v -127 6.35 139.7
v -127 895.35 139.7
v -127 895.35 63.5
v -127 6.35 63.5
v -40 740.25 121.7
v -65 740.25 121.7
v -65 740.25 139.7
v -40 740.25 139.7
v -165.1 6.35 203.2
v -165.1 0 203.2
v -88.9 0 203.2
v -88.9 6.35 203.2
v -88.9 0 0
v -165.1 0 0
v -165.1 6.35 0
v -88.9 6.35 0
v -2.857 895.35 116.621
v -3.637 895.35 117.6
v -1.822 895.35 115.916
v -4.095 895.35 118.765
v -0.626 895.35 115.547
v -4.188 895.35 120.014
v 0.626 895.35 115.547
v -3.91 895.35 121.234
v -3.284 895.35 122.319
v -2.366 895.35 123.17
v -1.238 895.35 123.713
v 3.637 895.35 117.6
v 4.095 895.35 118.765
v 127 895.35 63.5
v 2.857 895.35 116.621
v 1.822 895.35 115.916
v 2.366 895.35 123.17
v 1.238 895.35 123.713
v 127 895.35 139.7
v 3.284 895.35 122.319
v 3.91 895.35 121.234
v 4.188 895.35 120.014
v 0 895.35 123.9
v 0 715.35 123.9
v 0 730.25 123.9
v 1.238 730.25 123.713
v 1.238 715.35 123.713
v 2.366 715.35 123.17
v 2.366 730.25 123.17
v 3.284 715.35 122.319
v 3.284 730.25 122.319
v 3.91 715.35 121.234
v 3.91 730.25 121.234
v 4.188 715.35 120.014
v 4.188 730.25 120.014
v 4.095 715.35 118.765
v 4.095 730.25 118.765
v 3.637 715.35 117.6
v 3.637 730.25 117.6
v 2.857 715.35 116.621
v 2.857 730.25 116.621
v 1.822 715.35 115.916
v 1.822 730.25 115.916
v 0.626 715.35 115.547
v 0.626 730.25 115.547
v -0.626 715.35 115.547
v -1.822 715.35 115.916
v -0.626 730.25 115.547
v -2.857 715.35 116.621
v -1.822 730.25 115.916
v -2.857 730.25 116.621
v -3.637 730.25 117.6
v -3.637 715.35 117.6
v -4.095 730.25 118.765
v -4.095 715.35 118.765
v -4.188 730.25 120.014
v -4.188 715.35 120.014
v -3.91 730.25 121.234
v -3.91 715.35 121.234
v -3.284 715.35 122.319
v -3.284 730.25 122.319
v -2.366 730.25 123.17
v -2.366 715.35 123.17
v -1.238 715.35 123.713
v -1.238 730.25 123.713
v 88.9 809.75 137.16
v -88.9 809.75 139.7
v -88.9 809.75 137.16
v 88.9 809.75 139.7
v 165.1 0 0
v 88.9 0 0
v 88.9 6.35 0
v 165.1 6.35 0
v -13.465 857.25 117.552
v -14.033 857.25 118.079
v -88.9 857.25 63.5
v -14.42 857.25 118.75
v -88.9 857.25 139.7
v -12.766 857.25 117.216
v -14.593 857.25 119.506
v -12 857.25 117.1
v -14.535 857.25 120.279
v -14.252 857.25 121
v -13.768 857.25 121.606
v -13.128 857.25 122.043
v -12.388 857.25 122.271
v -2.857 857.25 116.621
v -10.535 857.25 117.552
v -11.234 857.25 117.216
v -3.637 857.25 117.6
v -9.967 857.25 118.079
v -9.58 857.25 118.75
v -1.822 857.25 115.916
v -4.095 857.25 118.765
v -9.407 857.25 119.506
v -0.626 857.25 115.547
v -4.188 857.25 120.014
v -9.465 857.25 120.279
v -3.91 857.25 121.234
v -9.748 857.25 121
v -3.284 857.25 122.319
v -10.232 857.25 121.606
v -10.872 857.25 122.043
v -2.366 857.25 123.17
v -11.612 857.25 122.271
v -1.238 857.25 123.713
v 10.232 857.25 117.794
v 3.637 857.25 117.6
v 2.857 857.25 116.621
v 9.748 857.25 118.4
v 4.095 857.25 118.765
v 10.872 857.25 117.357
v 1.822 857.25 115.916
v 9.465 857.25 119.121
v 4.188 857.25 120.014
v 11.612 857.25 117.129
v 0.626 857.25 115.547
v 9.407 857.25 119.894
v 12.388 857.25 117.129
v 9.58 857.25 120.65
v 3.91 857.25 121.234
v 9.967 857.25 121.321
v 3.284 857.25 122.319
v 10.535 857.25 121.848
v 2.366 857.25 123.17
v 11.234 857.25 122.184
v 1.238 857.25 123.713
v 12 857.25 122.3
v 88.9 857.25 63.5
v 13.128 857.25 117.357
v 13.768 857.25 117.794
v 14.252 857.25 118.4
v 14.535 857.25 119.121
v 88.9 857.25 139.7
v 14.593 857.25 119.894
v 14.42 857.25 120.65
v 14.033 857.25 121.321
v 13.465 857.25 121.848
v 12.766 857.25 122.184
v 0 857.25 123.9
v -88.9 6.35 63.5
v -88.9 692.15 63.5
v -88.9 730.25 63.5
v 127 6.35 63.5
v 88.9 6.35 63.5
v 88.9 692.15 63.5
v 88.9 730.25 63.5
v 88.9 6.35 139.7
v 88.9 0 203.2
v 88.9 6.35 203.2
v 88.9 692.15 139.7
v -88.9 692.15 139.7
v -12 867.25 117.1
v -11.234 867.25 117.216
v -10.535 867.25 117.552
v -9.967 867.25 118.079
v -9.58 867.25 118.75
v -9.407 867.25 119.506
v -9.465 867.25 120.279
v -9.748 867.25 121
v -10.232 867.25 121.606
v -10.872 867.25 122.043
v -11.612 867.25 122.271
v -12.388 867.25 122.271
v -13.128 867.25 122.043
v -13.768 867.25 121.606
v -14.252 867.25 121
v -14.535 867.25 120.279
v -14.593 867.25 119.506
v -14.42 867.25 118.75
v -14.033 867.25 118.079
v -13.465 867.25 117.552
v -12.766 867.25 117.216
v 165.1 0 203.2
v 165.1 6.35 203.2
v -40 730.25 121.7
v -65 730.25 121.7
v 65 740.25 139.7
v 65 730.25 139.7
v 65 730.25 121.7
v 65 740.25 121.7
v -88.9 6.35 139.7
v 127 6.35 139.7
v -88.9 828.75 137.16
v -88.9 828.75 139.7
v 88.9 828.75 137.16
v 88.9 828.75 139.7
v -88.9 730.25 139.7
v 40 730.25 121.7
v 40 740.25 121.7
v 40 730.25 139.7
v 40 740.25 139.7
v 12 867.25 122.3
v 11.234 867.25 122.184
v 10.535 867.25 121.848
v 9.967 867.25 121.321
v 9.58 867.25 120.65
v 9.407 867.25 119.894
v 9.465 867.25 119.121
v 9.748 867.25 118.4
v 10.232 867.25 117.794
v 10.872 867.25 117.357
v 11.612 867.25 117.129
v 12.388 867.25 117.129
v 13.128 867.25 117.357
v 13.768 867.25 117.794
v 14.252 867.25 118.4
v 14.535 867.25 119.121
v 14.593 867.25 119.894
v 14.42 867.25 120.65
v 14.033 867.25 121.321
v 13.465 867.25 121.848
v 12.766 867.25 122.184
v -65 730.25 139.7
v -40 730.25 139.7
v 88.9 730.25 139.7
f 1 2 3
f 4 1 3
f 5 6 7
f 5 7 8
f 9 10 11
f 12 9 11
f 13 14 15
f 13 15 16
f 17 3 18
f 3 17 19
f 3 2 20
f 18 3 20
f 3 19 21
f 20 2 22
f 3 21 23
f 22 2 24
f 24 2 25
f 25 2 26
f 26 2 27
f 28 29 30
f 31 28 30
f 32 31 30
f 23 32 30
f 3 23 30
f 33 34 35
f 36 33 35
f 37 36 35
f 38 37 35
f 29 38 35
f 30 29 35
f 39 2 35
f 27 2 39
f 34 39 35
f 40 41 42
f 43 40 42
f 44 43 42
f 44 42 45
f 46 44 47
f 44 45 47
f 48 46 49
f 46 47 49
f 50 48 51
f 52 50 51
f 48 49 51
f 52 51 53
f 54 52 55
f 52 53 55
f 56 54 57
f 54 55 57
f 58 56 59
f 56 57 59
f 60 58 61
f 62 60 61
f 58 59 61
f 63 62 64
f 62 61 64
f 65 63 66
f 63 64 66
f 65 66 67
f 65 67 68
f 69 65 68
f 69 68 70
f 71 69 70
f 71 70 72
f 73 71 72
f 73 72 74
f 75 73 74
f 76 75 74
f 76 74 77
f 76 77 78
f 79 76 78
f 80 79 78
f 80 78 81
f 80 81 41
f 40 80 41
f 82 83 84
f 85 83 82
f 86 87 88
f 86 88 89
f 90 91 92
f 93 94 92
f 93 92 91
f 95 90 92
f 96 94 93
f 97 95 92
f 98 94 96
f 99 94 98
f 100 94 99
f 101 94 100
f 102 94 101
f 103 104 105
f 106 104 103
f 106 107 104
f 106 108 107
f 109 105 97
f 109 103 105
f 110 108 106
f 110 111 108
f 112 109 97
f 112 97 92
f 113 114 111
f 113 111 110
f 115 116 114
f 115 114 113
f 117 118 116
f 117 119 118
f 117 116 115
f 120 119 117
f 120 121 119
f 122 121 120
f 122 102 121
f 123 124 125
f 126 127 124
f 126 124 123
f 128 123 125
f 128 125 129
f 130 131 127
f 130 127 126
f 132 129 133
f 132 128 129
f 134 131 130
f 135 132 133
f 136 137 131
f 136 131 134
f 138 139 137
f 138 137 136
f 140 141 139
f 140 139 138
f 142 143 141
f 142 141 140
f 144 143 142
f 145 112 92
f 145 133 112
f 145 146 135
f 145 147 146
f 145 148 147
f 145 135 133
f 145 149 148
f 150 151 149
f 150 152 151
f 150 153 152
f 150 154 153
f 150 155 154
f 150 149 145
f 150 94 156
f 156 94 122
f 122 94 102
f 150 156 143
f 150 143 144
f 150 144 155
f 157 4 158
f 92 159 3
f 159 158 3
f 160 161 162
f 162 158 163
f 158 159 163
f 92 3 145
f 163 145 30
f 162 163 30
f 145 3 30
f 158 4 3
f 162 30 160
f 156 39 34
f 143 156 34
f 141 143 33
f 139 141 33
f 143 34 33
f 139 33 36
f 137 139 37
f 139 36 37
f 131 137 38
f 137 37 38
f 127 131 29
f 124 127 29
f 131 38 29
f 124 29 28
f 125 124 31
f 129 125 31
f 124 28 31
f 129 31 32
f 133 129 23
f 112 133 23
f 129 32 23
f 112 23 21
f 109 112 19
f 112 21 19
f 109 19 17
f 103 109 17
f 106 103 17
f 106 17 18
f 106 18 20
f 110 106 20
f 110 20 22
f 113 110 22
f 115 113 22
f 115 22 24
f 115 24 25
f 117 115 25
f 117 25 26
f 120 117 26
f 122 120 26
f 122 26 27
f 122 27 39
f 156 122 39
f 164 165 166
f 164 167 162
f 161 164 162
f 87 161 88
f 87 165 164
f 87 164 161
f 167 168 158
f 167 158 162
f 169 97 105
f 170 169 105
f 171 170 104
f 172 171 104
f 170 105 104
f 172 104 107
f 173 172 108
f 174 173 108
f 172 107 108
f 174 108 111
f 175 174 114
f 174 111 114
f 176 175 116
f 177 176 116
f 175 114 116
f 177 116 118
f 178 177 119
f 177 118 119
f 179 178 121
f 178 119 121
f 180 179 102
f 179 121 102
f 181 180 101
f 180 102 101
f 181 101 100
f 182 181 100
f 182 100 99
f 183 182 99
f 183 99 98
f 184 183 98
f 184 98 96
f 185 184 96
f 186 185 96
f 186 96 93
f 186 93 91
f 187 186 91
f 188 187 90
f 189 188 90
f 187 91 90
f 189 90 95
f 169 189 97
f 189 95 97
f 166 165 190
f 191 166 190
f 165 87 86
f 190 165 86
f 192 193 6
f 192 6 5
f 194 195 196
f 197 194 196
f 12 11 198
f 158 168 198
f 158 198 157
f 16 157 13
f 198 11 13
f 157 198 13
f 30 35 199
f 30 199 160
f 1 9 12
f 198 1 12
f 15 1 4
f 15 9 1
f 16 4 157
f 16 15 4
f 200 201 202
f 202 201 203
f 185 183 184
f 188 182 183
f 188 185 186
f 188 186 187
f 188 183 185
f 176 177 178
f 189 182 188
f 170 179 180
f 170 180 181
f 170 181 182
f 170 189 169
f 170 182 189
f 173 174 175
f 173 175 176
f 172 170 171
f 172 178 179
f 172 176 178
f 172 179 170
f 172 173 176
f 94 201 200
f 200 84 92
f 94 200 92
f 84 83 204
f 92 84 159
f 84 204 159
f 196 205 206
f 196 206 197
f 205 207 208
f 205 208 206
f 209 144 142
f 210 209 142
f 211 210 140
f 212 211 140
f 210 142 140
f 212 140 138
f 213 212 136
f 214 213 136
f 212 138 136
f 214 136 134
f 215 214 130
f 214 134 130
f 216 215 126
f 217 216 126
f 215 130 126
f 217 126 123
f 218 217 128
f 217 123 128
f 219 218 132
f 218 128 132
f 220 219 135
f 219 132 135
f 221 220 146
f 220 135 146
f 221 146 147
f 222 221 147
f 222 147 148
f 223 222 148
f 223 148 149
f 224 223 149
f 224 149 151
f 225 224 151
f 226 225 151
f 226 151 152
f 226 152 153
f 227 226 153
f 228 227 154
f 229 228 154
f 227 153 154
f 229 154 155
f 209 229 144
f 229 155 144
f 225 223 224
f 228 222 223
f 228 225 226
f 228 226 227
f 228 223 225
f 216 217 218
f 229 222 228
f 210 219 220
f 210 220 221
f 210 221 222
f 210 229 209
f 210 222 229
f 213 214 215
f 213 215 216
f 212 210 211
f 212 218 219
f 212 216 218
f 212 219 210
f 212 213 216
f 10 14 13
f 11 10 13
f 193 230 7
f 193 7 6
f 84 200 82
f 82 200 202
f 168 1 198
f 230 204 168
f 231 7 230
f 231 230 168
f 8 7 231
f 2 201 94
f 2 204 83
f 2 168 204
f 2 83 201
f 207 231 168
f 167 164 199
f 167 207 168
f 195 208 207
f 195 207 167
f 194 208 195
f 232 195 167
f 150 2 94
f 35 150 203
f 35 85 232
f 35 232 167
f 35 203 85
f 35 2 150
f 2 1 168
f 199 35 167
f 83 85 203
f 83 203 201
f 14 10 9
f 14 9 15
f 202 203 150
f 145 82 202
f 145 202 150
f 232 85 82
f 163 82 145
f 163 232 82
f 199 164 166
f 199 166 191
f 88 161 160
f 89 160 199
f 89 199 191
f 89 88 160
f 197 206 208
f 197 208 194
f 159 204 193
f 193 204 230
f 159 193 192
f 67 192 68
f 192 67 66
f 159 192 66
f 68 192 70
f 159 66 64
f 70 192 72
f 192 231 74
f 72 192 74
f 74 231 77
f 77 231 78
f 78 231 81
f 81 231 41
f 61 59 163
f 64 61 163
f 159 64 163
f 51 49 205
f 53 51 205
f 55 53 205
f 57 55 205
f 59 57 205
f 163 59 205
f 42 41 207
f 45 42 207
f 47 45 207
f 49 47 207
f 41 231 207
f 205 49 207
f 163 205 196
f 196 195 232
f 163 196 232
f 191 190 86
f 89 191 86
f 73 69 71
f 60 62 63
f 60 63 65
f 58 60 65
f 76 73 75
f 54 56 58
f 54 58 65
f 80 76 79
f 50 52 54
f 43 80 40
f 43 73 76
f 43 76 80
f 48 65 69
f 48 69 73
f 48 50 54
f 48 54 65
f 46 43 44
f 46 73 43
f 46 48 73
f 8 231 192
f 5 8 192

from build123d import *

# Parameters (mm, degrees)
SKETCH1_W             = 76.2
SKETCH1_H             = 203.2
BOSS_EXTRUDE1_DEPTH   = 6.35
BOSS_EXTRUDE1_2_DEPTH = 6.35
SKETCH2_W             = 38.1
SKETCH2_H             = 76.2
BOSS_EXTRUDE2_DEPTH   = 889
SKETCH3_W             = 177.8
SKETCH3_H             = 38.1
BOSS_EXTRUDE3_DEPTH   = 76.2
SKETCH4_R             = 4.2
CUT_EXTRUDE1_DEPTH    = 180
SKETCH5_R             = 2.6
CUT_EXTRUDE2_DEPTH    = 10
SKETCH6_W             = 25
SKETCH6_H             = 18
BOSS_EXTRUDE4_DEPTH   = 10
SKETCH7_W             = 177.8
SKETCH7_H             = 19
BOSS_EXTRUDE5_DEPTH   = 2.54


with BuildPart() as part:
    # Sketch1 → Boss-Extrude1 (new body)
    with BuildSketch(Plane(origin=(0, 0, 0), x_dir=(1, 0, 0), z_dir=(0, 1, 0))):
        with Locations((127, -101.6)):
            Rectangle(SKETCH1_W, SKETCH1_H)
    extrude(amount=BOSS_EXTRUDE1_DEPTH)



with BuildPart() as body_2:
    # Sketch1 → Boss-Extrude1 2 (new body)
    with BuildSketch(Plane(origin=(0, 0, 0), x_dir=(1, 0, 0), z_dir=(0, 1, 0))):
        with Locations((-127, -101.6)):
            Rectangle(SKETCH1_W, SKETCH1_H)
    extrude(amount=BOSS_EXTRUDE1_2_DEPTH)


with BuildPart() as part_1:
    add(part.part)

    add(body_2.part)  # Boss-Extrude2 merges body 2
    # Sketch2 → Boss-Extrude2 (add)
    with BuildSketch(Plane(origin=(0, 6.35, 0), x_dir=(1, 0, 0), z_dir=(0, 1, 0))):
        with Locations((-107.95, -101.6)):
            Rectangle(SKETCH2_W, SKETCH2_H)
        with Locations((107.95, -101.6)):
            Rectangle(SKETCH2_W, SKETCH2_H)
    extrude(amount=BOSS_EXTRUDE2_DEPTH)

    # Sketch3 → Boss-Extrude3 (add)
    with BuildSketch(Plane.XY.offset(139.7)):
        with Locations((0, 876.3)):
            Rectangle(SKETCH3_W, SKETCH3_H)
        with Locations((0, 711.2)):
            Rectangle(SKETCH3_W, SKETCH3_H)
    extrude(amount=-BOSS_EXTRUDE3_DEPTH)

    # Sketch4 → Cut-Extrude1 (cut)
    with BuildSketch(Plane(origin=(0, 895.35, 0), x_dir=(1, 0, 0), z_dir=(0, 1, 0))):
        with Locations(Location((0, -119.7, 0), (0, 0, 270))):
            Circle(SKETCH4_R)
    extrude(amount=-CUT_EXTRUDE1_DEPTH, mode=Mode.SUBTRACT)

    # Sketch5 → Cut-Extrude2 (cut)
    with BuildSketch(Plane.XZ.offset(-857.25)):
        with Locations(Location((-12, 119.7, 0), (0, 0, 270))):
            Circle(SKETCH5_R)
        with Locations(Location((12, 119.7, 0), (0, 0, 90))):
            Circle(SKETCH5_R)
    extrude(amount=-CUT_EXTRUDE2_DEPTH, mode=Mode.SUBTRACT)

    # Sketch6 → Boss-Extrude4 (add)
    with BuildSketch(Plane(origin=(0, 730.25, 0), x_dir=(1, 0, 0), z_dir=(0, 1, 0))):
        with Locations((52.5, -130.7)):
            Rectangle(SKETCH6_W, SKETCH6_H)
        with Locations((-52.5, -130.7)):
            Rectangle(SKETCH6_W, SKETCH6_H)
    extrude(amount=BOSS_EXTRUDE4_DEPTH)

    # Sketch7 → Boss-Extrude5 (add)
    with BuildSketch(Plane.XY.offset(139.7)):
        with Locations((0, 819.25)):
            Rectangle(SKETCH7_W, SKETCH7_H)
    extrude(amount=-BOSS_EXTRUDE5_DEPTH)


solid = part_1.part
